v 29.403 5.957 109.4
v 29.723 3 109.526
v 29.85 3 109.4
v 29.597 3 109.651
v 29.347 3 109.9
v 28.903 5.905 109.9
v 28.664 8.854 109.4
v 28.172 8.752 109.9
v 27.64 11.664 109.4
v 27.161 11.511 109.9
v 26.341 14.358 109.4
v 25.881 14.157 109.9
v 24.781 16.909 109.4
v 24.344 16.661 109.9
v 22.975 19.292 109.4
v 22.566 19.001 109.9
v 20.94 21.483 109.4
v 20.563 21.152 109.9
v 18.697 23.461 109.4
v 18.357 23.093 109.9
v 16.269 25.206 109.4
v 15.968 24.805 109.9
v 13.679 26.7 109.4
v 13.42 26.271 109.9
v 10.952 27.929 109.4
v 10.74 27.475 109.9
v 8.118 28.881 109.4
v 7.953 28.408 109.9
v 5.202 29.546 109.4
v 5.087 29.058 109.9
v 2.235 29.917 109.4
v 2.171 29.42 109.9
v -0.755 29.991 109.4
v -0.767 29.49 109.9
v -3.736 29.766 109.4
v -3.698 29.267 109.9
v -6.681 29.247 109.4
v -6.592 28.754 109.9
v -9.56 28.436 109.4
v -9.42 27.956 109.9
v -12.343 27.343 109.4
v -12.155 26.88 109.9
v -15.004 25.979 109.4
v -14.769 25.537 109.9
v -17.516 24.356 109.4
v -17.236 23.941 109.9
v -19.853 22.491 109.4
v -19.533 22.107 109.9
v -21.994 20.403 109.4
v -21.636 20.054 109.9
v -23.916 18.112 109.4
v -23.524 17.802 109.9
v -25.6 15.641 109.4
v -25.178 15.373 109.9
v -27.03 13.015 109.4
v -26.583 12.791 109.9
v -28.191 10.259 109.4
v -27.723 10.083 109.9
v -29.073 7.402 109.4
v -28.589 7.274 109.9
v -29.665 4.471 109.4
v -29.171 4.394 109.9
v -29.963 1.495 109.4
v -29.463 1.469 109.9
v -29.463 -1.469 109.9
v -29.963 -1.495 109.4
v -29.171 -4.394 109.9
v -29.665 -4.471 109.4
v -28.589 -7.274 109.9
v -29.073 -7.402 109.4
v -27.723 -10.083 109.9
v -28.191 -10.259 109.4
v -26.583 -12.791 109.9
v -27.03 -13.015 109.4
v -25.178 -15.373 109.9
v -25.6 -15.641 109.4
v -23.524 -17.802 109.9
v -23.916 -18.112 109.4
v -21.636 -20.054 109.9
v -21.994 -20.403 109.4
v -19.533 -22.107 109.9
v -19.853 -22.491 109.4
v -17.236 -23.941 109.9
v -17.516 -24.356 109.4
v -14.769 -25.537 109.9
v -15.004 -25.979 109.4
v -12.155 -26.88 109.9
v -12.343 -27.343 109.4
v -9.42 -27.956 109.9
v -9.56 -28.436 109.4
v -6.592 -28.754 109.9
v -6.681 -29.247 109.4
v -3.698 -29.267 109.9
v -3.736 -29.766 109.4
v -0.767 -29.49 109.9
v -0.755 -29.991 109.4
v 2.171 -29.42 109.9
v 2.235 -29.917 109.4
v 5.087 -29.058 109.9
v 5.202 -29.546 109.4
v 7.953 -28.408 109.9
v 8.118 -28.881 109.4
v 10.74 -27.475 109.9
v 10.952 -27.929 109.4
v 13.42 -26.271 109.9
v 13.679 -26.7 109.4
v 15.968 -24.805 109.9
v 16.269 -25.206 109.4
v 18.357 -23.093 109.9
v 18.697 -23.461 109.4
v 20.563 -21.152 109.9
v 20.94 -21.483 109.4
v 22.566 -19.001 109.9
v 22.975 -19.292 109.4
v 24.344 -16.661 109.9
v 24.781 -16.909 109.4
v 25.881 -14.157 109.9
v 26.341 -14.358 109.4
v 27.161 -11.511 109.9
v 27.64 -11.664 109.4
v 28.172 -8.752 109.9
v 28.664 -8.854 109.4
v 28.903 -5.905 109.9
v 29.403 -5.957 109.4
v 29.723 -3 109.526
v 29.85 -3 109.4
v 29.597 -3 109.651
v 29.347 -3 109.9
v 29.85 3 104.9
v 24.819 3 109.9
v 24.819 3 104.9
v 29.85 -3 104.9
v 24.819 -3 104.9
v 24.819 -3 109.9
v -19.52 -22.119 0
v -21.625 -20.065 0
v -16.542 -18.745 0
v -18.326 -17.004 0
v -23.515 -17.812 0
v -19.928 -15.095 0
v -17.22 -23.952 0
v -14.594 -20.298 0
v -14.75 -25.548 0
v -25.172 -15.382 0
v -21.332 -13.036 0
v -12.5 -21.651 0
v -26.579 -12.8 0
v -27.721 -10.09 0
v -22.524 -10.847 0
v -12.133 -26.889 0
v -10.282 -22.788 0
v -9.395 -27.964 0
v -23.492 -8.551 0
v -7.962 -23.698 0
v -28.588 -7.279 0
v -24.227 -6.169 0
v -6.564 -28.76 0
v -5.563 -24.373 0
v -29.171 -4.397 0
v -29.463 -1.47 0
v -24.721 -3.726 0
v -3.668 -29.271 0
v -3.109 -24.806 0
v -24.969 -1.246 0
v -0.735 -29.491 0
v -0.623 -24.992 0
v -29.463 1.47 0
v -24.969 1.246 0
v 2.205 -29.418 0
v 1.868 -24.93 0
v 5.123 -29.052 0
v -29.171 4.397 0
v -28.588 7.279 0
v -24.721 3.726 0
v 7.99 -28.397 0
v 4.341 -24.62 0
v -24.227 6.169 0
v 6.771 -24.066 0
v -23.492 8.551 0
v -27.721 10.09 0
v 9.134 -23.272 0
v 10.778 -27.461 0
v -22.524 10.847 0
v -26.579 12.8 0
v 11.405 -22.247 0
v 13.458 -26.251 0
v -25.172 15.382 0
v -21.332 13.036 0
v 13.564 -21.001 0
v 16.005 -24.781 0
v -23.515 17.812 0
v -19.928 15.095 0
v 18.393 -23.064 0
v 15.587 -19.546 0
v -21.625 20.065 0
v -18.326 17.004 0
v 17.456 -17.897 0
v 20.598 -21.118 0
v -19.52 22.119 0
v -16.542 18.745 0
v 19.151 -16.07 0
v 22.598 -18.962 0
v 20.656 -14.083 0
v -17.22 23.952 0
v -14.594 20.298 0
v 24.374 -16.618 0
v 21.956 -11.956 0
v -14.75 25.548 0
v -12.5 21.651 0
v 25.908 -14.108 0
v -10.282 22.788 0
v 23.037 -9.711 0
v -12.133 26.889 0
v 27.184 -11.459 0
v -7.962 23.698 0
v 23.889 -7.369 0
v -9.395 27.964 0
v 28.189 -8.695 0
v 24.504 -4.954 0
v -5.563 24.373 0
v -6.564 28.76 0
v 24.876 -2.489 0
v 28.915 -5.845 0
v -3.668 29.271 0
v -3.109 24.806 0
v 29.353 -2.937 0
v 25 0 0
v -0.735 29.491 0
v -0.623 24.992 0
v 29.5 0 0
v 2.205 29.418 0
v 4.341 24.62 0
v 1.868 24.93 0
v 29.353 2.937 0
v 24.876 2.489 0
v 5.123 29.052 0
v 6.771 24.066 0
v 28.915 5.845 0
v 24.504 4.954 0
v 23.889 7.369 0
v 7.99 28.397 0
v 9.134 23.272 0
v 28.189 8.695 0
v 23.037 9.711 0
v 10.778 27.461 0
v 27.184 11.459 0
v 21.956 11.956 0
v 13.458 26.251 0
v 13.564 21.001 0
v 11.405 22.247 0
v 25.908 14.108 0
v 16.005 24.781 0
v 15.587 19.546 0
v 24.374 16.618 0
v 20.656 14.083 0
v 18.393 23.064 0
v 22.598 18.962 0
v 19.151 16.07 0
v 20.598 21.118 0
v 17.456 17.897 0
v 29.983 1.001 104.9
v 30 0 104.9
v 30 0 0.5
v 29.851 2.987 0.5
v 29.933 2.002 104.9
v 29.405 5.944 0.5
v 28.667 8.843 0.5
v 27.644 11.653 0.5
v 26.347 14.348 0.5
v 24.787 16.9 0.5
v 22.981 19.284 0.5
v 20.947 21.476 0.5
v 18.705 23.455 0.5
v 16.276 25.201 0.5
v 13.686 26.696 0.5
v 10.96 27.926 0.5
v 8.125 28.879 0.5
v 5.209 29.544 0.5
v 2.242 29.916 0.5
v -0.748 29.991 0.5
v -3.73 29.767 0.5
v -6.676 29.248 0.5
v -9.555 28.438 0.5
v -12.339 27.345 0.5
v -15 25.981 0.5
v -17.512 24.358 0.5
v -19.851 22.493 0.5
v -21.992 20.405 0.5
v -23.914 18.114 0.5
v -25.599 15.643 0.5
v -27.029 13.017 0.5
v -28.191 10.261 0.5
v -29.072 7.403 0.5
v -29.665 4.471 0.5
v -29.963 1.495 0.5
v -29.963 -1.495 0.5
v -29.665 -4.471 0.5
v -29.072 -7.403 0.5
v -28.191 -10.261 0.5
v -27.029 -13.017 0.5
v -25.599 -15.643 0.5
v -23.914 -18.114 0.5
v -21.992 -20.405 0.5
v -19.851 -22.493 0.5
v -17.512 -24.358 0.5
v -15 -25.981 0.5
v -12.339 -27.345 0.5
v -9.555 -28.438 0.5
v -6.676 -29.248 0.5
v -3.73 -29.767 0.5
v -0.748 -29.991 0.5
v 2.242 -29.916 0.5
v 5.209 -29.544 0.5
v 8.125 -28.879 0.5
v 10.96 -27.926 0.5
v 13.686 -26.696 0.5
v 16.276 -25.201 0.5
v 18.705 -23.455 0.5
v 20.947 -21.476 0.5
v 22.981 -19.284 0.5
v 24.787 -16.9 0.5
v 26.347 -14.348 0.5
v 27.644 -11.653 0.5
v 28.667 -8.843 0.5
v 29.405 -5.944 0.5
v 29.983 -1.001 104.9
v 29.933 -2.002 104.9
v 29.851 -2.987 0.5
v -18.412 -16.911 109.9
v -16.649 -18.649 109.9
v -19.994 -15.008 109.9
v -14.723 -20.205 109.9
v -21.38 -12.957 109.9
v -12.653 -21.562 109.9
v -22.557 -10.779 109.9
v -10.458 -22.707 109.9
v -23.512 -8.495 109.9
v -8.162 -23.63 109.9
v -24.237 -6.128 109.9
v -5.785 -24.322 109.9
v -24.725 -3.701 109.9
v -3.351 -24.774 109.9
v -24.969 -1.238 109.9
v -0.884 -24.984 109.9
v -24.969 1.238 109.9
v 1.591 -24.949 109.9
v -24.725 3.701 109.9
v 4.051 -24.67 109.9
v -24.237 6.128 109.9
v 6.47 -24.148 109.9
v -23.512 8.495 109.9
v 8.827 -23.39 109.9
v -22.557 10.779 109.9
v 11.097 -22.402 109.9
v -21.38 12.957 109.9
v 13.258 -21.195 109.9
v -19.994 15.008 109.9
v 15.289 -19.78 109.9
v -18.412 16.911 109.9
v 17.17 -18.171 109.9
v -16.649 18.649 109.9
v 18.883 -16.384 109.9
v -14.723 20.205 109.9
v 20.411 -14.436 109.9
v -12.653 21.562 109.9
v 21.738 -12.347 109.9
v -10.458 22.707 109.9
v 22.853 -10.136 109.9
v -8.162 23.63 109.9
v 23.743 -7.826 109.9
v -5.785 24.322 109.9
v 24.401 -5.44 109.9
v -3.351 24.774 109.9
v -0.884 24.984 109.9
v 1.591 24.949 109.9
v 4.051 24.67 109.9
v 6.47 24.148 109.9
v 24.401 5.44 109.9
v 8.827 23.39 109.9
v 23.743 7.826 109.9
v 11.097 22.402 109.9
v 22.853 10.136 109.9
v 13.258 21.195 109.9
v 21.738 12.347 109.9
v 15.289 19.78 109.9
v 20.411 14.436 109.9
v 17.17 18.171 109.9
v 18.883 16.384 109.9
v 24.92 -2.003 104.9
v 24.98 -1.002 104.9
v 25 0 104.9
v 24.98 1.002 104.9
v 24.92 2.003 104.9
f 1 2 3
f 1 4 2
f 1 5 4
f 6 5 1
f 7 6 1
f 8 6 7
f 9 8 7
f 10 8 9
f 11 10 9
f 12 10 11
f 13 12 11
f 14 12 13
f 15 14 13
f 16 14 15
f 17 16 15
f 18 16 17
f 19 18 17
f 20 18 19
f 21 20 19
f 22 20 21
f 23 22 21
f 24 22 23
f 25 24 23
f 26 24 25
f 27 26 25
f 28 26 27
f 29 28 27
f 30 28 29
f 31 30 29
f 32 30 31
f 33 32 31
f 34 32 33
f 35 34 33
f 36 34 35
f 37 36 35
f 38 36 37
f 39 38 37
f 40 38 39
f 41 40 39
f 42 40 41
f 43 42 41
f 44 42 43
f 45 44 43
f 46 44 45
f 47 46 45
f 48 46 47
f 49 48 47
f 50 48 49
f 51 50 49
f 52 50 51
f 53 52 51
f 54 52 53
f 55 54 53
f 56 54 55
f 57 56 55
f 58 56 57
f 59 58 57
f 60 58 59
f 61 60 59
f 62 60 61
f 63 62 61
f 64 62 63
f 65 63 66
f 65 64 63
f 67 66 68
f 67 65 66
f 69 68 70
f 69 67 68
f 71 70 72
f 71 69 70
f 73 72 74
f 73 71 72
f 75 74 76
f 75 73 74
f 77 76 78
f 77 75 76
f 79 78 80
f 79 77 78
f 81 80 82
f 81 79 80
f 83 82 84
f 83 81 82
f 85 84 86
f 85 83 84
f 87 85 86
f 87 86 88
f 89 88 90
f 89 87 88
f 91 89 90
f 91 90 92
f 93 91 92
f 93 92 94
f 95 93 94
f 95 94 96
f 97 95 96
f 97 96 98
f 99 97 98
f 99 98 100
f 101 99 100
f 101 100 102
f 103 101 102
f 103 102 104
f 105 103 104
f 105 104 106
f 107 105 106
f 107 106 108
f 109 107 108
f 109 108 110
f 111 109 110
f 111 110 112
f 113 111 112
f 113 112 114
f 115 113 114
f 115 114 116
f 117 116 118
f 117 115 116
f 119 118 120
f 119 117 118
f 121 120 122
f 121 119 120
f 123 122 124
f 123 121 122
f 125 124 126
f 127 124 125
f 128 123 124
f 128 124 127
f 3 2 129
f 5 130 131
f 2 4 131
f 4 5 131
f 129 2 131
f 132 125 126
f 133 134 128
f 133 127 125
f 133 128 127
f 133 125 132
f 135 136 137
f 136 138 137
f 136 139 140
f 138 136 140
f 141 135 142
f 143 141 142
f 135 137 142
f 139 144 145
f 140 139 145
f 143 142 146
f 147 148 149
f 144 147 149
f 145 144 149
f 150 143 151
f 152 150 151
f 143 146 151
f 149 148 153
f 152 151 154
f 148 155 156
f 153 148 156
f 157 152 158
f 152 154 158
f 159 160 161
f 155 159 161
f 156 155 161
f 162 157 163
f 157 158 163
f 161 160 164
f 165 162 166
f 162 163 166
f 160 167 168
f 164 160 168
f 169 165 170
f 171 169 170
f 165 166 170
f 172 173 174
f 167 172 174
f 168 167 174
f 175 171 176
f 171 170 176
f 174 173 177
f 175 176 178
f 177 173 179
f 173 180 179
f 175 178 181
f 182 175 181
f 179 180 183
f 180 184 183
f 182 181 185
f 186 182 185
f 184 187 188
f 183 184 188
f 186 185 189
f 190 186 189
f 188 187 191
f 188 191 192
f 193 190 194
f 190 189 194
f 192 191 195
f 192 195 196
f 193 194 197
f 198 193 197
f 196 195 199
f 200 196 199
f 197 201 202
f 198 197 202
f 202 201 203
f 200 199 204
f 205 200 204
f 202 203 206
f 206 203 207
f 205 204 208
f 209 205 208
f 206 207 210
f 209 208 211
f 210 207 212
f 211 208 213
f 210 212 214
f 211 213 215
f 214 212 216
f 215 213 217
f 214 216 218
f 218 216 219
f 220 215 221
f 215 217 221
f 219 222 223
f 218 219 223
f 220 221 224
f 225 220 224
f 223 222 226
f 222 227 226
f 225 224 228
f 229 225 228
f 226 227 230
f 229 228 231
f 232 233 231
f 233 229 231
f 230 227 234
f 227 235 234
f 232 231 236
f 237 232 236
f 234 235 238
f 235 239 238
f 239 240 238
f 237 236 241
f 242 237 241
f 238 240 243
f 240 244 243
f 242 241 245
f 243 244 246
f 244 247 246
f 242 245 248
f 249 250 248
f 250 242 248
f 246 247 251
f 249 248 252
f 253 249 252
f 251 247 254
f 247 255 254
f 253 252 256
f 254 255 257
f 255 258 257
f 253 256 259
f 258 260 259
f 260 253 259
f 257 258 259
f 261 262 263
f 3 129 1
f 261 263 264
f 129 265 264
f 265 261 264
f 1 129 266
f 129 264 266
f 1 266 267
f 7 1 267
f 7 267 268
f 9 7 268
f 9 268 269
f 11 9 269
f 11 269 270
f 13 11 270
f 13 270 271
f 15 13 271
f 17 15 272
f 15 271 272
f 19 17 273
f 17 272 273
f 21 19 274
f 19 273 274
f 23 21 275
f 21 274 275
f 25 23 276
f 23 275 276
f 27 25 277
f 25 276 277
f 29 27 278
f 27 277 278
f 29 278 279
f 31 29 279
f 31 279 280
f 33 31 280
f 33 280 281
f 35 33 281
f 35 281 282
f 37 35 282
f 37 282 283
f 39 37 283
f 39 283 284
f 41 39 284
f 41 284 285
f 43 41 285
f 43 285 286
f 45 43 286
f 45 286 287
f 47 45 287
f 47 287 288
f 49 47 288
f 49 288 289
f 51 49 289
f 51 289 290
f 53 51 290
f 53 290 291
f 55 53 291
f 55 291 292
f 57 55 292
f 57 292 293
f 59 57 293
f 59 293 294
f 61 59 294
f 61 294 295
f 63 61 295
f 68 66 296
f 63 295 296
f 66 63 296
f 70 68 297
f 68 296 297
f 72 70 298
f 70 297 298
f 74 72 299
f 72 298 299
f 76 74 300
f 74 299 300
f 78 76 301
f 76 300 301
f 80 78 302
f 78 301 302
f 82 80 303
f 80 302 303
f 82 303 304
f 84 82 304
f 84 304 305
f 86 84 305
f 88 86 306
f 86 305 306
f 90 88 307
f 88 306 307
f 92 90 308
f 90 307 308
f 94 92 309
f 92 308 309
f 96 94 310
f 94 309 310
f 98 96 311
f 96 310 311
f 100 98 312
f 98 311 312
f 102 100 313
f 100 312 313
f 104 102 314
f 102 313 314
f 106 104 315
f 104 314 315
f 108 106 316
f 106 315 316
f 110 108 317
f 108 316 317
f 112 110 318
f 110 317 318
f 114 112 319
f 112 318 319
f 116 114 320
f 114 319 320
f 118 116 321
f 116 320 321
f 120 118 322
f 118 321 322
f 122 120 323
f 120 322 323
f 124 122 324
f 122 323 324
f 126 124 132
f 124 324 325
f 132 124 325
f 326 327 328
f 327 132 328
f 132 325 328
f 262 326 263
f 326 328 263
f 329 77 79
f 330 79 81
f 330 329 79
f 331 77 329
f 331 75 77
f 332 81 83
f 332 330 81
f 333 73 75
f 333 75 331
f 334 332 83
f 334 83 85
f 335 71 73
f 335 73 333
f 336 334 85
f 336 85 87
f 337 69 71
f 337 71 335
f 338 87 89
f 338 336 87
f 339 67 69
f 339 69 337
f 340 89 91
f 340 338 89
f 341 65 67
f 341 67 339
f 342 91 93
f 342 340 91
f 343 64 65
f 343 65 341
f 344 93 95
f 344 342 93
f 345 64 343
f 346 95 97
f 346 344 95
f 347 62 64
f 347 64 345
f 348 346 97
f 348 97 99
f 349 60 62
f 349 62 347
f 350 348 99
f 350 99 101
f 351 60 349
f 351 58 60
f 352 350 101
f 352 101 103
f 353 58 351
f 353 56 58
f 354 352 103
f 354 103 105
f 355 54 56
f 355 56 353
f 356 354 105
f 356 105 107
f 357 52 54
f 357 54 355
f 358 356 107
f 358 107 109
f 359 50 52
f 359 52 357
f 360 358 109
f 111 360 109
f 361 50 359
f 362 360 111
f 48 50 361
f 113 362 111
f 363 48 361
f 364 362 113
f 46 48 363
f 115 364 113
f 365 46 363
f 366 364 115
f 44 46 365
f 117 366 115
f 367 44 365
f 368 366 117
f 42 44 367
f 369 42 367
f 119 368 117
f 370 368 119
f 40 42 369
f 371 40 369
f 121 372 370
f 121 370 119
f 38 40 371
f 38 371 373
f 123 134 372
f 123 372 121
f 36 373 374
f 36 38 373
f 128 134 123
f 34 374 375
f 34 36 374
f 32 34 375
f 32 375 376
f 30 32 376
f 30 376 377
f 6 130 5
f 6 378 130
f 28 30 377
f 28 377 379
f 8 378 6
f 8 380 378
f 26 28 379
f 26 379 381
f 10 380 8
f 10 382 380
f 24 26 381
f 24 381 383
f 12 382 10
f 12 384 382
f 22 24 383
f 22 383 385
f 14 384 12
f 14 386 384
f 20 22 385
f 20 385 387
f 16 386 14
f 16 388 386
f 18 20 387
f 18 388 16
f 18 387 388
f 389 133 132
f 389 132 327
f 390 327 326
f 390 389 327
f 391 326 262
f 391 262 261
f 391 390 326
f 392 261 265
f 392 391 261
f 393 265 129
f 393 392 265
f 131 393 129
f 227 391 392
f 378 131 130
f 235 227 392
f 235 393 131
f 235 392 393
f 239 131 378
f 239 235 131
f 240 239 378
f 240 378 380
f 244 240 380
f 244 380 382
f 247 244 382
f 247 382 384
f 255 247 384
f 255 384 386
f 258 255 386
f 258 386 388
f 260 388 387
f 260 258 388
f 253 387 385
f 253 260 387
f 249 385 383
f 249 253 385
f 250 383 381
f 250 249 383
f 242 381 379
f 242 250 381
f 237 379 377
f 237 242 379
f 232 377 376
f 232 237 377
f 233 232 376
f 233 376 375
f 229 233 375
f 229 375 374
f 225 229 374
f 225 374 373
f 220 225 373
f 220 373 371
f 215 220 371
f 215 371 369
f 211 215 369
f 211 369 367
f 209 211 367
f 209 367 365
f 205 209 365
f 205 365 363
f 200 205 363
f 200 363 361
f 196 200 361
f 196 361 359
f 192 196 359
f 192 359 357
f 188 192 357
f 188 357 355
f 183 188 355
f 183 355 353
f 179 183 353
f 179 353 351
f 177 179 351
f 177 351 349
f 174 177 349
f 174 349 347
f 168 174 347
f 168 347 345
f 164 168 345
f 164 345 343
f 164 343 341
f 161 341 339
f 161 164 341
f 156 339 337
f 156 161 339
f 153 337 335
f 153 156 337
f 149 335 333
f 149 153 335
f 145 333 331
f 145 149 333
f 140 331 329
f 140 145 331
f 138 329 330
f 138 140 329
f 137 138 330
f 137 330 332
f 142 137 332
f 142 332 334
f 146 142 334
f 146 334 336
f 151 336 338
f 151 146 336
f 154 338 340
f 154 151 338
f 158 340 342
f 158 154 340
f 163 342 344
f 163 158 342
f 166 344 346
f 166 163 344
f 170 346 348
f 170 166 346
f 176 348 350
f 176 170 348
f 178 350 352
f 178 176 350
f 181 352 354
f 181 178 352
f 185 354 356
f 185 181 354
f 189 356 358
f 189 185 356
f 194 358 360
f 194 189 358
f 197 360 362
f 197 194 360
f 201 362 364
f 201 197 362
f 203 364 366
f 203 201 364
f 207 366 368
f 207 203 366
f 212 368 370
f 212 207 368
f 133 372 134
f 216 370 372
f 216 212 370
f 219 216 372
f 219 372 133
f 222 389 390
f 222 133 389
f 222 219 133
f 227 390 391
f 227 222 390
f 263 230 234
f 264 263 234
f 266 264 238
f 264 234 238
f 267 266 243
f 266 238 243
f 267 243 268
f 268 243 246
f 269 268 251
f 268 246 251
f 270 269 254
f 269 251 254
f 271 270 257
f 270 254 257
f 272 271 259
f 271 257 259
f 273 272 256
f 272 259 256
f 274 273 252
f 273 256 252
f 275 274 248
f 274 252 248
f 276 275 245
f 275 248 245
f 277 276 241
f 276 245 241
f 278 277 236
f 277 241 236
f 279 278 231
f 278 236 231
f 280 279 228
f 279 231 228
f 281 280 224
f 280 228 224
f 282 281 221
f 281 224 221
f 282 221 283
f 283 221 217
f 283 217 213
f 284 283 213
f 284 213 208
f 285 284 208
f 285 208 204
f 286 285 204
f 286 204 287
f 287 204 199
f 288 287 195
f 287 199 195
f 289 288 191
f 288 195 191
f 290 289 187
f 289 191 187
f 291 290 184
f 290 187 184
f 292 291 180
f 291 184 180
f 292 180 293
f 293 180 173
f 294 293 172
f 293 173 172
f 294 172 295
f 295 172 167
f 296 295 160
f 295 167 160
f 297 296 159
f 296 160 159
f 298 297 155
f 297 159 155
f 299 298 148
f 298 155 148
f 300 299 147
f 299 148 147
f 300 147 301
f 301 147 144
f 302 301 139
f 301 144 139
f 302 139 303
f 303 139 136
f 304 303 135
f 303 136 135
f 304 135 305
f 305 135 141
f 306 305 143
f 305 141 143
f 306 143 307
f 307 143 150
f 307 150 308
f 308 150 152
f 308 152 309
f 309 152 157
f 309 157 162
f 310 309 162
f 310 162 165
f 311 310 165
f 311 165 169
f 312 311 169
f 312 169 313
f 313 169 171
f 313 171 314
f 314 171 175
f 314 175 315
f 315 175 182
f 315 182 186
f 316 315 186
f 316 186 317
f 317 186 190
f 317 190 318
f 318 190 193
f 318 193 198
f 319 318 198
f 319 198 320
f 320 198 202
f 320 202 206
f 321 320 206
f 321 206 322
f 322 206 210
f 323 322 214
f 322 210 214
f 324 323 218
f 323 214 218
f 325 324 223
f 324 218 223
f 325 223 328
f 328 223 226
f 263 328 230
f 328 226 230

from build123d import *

# Parameters (mm, degrees)
SKETCH1_R           = 30
SKETCH1_R_2         = 25
BOSS_EXTRUDE1_DEPTH = 109.9
SKETCH2_W           = 5
SKETCH2_H           = 6
CUT_EXTRUDE1_DEPTH  = 31
CHAMFER1_SIZE       = 0.5


with BuildPart() as part:
    # Sketch1 → Boss-Extrude1 (new body)
    with BuildSketch(Plane.XY):
        Circle(SKETCH1_R)
        Circle(SKETCH1_R_2, mode=Mode.SUBTRACT)
    extrude(amount=BOSS_EXTRUDE1_DEPTH)

    # Sketch2 → Cut-Extrude1 (cut, through all)
    with BuildSketch(Plane(origin=(0, 0, 0), x_dir=(0, 0, -1), z_dir=(1, 0, 0))):
        with Locations((-107.4, 0)):
            Rectangle(SKETCH2_W, SKETCH2_H)
    extrude(amount=CUT_EXTRUDE1_DEPTH, mode=Mode.SUBTRACT)

    # Chamfer1
    chamfer1_edges = [part.edges().sort_by_distance(p)[0] for p in [
        (-30, 0, 109.9),
        (-30, 0, 0),
    ]]
    chamfer(chamfer1_edges, length=CHAMFER1_SIZE)


solid = part.part
